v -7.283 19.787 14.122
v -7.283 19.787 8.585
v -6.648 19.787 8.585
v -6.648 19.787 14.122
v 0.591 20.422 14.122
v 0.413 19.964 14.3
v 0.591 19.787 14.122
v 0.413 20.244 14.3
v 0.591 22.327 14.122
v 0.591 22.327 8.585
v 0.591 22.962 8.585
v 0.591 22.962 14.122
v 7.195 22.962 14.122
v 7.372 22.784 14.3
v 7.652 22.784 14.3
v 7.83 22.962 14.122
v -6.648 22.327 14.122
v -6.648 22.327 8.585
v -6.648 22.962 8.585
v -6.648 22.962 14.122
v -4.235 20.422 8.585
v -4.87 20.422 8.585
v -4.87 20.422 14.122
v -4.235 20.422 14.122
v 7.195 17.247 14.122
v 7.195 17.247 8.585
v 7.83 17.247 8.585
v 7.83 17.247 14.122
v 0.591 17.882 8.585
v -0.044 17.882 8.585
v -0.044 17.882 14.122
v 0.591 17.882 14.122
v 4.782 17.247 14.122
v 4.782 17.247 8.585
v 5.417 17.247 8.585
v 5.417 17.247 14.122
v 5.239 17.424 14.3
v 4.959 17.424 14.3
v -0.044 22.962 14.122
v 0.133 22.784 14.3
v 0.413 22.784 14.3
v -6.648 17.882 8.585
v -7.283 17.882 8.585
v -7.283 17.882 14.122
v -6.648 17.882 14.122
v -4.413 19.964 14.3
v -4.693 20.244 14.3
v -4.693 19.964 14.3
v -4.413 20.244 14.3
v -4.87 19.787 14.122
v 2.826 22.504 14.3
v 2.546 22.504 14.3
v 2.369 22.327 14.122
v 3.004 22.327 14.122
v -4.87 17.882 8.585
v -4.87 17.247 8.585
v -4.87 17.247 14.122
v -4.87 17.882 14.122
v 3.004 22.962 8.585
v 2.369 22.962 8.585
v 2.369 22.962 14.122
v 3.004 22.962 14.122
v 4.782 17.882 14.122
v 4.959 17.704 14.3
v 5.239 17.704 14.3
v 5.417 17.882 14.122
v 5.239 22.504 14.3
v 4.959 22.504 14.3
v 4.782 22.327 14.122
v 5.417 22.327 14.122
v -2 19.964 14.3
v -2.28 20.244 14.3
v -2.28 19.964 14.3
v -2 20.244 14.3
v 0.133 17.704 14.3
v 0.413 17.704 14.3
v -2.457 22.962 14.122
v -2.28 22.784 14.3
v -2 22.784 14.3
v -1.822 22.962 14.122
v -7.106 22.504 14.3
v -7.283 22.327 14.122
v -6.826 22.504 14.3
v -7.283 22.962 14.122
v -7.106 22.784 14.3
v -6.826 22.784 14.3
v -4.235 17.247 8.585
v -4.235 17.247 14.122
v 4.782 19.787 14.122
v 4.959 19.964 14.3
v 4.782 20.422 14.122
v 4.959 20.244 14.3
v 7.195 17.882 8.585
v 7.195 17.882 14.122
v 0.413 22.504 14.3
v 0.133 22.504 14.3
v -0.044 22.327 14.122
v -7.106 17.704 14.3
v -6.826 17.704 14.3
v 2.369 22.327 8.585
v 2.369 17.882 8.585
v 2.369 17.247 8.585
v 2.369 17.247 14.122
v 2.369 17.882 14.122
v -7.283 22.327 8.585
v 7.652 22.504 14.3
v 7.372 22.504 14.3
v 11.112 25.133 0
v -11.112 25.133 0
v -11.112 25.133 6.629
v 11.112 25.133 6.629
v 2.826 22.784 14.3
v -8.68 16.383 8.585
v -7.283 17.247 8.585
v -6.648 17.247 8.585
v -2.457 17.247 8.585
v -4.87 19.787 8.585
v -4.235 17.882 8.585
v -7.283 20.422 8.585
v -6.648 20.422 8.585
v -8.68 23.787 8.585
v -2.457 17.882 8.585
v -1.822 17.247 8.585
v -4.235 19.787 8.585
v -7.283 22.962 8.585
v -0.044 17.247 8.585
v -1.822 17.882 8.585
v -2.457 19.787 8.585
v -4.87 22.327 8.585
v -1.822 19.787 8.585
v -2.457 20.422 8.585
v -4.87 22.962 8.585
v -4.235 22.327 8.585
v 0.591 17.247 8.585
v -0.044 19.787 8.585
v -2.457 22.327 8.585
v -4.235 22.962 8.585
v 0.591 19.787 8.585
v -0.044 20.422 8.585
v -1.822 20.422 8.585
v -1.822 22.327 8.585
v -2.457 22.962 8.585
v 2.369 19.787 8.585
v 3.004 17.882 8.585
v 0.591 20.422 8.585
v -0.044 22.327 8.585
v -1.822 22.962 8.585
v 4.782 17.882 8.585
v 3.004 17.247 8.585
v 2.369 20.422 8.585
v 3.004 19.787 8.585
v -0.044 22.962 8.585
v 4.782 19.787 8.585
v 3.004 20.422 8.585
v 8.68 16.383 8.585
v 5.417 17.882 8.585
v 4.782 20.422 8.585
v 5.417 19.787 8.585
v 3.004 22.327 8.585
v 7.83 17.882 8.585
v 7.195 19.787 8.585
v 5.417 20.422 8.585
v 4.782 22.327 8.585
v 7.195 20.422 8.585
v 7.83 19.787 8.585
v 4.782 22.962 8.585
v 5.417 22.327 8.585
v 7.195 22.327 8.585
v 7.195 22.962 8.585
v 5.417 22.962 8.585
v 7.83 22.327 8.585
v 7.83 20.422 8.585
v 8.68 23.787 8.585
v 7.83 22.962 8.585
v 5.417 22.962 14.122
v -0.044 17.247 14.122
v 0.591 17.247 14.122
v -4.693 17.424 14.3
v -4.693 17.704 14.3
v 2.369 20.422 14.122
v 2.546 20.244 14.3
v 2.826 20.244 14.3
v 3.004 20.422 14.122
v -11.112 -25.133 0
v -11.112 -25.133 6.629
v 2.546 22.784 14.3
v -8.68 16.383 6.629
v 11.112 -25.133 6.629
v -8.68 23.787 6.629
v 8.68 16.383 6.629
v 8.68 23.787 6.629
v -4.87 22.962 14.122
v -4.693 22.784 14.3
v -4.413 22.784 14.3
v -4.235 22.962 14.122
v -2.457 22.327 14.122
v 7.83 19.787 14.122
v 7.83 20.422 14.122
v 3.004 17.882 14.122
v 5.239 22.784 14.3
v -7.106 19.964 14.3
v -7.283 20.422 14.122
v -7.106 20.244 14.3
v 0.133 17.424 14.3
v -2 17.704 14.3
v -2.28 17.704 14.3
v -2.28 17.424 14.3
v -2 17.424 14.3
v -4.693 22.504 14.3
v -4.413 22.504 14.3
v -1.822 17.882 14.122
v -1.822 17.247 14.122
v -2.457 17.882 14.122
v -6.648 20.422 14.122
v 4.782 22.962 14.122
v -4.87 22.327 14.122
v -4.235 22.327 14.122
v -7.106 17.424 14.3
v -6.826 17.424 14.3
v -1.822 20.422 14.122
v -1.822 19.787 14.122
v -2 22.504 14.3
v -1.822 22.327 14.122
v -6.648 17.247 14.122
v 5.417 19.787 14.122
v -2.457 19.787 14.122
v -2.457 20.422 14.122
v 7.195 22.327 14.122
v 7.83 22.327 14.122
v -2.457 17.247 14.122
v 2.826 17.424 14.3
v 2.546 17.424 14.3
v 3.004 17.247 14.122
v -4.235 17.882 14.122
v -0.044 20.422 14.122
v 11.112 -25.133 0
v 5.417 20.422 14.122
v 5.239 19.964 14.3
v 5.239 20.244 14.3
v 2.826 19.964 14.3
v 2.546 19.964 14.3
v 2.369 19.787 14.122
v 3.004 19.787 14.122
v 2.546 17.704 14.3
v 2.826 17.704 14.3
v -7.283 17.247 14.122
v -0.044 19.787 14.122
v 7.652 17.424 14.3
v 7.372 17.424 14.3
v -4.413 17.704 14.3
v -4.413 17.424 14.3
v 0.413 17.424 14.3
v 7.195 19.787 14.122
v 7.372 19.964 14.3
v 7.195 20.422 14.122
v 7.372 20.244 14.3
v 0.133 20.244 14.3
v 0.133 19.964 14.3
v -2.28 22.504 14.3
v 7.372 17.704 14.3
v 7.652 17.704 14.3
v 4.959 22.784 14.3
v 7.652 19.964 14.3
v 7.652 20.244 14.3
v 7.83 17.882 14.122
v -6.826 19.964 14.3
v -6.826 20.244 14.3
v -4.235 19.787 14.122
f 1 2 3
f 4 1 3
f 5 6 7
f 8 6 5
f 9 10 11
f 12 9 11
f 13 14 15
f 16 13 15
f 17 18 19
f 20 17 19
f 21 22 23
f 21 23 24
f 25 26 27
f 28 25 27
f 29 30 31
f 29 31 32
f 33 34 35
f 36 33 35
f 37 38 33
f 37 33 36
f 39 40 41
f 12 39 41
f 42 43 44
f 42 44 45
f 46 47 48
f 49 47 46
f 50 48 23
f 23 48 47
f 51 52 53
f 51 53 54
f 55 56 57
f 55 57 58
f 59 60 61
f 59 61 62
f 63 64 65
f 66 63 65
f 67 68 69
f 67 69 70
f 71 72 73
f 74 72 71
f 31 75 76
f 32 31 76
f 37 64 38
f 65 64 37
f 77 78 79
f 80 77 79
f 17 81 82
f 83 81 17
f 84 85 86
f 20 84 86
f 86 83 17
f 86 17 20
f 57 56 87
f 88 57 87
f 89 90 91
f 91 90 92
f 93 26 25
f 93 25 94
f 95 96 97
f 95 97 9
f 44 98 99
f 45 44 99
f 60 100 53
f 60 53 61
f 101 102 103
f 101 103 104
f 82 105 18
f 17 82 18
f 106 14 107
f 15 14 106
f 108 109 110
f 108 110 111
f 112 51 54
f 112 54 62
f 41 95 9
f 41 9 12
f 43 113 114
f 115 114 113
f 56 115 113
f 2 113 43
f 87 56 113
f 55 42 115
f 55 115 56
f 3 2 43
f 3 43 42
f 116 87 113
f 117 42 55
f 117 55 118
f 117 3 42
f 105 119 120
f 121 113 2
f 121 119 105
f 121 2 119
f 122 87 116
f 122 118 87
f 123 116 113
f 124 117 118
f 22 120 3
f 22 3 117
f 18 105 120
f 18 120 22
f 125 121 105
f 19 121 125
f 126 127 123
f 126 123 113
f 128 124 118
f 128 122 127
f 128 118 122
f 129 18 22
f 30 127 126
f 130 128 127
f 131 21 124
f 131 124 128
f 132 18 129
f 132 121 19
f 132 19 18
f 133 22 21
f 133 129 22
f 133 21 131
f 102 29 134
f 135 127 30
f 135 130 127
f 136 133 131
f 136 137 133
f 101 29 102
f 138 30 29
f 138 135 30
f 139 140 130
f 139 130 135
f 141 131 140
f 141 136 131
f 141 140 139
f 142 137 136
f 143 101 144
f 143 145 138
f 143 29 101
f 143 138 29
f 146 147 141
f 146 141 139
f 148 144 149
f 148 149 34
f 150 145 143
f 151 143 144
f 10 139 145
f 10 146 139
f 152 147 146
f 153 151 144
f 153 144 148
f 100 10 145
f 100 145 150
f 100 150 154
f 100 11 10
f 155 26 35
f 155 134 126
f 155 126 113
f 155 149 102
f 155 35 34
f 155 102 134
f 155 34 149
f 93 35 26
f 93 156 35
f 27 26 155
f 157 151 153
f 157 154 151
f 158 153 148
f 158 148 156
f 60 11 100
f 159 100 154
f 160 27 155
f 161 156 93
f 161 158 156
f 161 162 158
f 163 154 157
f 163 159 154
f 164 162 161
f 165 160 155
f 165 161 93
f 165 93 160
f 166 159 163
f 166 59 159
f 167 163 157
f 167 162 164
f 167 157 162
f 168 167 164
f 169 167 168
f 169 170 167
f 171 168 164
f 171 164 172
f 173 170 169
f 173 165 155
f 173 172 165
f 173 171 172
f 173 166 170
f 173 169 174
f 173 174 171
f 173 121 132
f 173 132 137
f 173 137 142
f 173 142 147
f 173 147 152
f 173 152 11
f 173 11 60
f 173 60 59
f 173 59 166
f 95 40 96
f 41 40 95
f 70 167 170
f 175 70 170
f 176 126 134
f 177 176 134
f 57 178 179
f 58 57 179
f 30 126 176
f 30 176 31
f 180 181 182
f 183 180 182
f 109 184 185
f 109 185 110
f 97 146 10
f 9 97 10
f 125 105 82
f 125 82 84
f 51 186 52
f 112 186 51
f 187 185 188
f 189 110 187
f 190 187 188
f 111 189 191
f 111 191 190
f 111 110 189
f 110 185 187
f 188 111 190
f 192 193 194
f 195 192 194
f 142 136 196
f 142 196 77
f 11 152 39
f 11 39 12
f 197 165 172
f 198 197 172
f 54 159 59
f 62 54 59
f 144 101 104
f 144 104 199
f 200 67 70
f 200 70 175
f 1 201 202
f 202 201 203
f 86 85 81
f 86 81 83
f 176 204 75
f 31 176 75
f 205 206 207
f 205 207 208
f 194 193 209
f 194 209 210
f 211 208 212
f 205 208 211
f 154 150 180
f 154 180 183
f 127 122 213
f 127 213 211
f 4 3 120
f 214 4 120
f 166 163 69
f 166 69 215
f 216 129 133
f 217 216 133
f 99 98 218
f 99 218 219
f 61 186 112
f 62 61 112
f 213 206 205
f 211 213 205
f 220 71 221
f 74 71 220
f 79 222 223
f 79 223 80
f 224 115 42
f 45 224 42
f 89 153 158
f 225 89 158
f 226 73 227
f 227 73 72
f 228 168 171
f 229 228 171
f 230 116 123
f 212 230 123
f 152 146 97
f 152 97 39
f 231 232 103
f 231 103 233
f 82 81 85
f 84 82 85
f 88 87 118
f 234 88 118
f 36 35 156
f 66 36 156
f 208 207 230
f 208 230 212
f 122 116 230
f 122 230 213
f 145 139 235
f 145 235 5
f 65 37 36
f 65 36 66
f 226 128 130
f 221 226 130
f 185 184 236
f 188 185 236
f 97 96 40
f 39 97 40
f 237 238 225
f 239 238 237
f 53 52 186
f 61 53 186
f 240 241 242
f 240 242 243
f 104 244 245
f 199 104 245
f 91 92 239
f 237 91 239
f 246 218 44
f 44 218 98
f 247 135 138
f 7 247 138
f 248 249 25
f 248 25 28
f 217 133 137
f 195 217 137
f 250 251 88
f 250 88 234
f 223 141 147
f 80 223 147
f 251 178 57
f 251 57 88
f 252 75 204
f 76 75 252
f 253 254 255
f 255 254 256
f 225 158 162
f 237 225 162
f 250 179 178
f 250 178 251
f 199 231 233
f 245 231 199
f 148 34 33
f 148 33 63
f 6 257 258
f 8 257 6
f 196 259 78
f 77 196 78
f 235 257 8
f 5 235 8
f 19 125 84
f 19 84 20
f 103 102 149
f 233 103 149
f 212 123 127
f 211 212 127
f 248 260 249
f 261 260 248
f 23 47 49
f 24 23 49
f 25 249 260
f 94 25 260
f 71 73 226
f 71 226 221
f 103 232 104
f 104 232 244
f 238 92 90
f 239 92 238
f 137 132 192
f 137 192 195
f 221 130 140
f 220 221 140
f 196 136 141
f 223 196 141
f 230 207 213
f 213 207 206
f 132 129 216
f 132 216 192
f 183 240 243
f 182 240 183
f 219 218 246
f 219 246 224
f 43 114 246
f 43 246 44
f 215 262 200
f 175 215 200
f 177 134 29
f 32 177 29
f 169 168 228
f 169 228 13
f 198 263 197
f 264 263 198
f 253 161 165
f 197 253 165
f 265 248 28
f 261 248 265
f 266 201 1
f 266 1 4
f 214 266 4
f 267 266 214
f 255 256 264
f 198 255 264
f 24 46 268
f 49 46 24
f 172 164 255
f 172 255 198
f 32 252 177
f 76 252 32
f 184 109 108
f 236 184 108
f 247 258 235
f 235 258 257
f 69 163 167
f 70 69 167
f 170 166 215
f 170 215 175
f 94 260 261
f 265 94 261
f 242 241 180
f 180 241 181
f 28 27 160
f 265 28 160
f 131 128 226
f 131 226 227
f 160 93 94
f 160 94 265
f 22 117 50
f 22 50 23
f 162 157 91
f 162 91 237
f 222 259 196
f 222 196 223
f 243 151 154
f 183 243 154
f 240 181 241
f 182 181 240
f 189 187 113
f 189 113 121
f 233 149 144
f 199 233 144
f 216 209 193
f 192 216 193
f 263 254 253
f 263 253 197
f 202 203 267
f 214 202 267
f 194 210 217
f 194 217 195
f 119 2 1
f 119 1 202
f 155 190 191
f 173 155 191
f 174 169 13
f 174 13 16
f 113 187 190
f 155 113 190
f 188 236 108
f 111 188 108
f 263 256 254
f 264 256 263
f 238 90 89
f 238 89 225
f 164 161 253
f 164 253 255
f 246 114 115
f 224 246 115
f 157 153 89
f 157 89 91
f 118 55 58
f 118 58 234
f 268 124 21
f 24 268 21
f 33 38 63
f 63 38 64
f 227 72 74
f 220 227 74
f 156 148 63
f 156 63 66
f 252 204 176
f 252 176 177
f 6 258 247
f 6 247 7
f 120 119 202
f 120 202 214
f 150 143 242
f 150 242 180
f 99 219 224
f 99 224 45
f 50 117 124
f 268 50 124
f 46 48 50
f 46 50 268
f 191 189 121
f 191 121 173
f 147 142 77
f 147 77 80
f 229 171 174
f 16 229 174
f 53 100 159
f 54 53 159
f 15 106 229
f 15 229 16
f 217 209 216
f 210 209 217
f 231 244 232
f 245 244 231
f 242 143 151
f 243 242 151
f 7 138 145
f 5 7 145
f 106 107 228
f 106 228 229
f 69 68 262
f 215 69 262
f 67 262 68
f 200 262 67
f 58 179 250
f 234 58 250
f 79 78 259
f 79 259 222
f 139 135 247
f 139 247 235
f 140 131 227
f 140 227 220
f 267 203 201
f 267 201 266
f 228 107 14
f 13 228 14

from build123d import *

# Parameters (mm, degrees)
F0_W     = 22.225
F0_H     = 50.2666
F1_DEPTH = 6.6294
F2_W     = 17.3609
F2_H     = 7.4041
F3_DEPTH = 1.9558
F4_W     = 0.635
F4_H     = 0.635
F5_DEPTH = 5.715
F6_SIZE  = 0.1778


with BuildPart() as f1:
    # F0 (on Top) → F1 (new body)
    with BuildSketch(Plane.XY):
        Rectangle(F0_W, F0_H)
    extrude(amount=F1_DEPTH)

    # F2 (on face) → F3 (join)
    with BuildSketch(Plane.XY.offset(6.6294)):
        with Locations((0, 20.08505)):
            Rectangle(F2_W, F2_H)
    extrude(amount=F3_DEPTH)

    # F4 (on face) → F5 (join)
    with BuildSketch(Plane.XY.offset(8.5852)):
        with Locations((7.51205, 22.6441)):
            Rectangle(F4_W, F4_H)
        with Locations((5.09905, 22.6441)):
            Rectangle(F4_W, F4_H)
        with Locations((2.68605, 22.6441)):
            Rectangle(F4_W, F4_H)
        with Locations((0.27305, 22.6441)):
            Rectangle(F4_W, F4_H)
        with Locations((-2.13995, 22.6441)):
            Rectangle(F4_W, F4_H)
        with Locations((-4.55295, 22.6441)):
            Rectangle(F4_W, F4_H)
        with Locations((-6.96595, 22.6441)):
            Rectangle(F4_W, F4_H)
        with Locations((-6.96595, 20.1041)):
            Rectangle(F4_W, F4_H)
        with Locations((-4.55295, 20.1041)):
            Rectangle(F4_W, F4_H)
        with Locations((-2.13995, 20.1041)):
            Rectangle(F4_W, F4_H)
        with Locations((0.27305, 20.1041)):
            Rectangle(F4_W, F4_H)
        with Locations((2.68605, 20.1041)):
            Rectangle(F4_W, F4_H)
        with Locations((5.09905, 20.1041)):
            Rectangle(F4_W, F4_H)
        with Locations((7.51205, 20.1041)):
            Rectangle(F4_W, F4_H)
        with Locations((-6.96595, 17.5641)):
            Rectangle(F4_W, F4_H)
        with Locations((-4.55295, 17.5641)):
            Rectangle(F4_W, F4_H)
        with Locations((-2.13995, 17.5641)):
            Rectangle(F4_W, F4_H)
        with Locations((0.27305, 17.5641)):
            Rectangle(F4_W, F4_H)
        with Locations((2.68605, 17.5641)):
            Rectangle(F4_W, F4_H)
        with Locations((5.09905, 17.5641)):
            Rectangle(F4_W, F4_H)
        with Locations((7.51205, 17.5641)):
            Rectangle(F4_W, F4_H)
    extrude(amount=F5_DEPTH)

    # F6
    f6_edges = [f1.edges().sort_by_distance(p)[0] for p in [
        (-6.96595, 22.9616, 14.3002),
        (-7.28345, 22.6441, 14.3002),
        (-6.96595, 22.3266, 14.3002),
        (-6.64845, 22.6441, 14.3002),
        (-6.64845, 20.1041, 14.3002),
        (-6.96595, 20.4216, 14.3002),
        (-7.28345, 20.1041, 14.3002),
        (-6.96595, 19.7866, 14.3002),
        (-4.55295, 22.9616, 14.3002),
        (-4.87045, 22.6441, 14.3002),
        (-4.55295, 22.3266, 14.3002),
        (-4.23545, 22.6441, 14.3002),
        (-4.55295, 20.4216, 14.3002),
        (-4.87045, 20.1041, 14.3002),
        (-4.55295, 19.7866, 14.3002),
        (-4.23545, 20.1041, 14.3002),
        (-6.64845, 17.5641, 14.3002),
        (-6.96595, 17.8816, 14.3002),
        (-7.28345, 17.5641, 14.3002),
        (-6.96595, 17.2466, 14.3002),
        (-4.55295, 17.8816, 14.3002),
        (-4.87045, 17.5641, 14.3002),
        (-4.55295, 17.2466, 14.3002),
        (-4.23545, 17.5641, 14.3002),
        (-2.13995, 20.4216, 14.3002),
        (-2.45745, 20.1041, 14.3002),
        (-2.13995, 19.7866, 14.3002),
        (-1.82245, 20.1041, 14.3002),
        (-2.13995, 22.9616, 14.3002),
        (-2.45745, 22.6441, 14.3002),
        (-2.13995, 22.3266, 14.3002),
        (-1.82245, 22.6441, 14.3002),
        (-2.13995, 17.8816, 14.3002),
        (-2.45745, 17.5641, 14.3002),
        (-2.13995, 17.2466, 14.3002),
        (-1.82245, 17.5641, 14.3002),
        (0.27305, 17.8816, 14.3002),
        (-0.04445, 17.5641, 14.3002),
        (0.27305, 17.2466, 14.3002),
        (0.59055, 17.5641, 14.3002),
        (0.27305, 20.4216, 14.3002),
        (-0.04445, 20.1041, 14.3002),
        (0.27305, 19.7866, 14.3002),
        (0.59055, 20.1041, 14.3002),
        (0.27305, 22.9616, 14.3002),
        (-0.04445, 22.6441, 14.3002),
        (0.27305, 22.3266, 14.3002),
        (0.59055, 22.6441, 14.3002),
        (2.68605, 22.9616, 14.3002),
        (2.36855, 22.6441, 14.3002),
        (2.68605, 22.3266, 14.3002),
        (3.00355, 22.6441, 14.3002),
        (2.36855, 20.1041, 14.3002),
        (2.68605, 19.7866, 14.3002),
        (2.68605, 20.4216, 14.3002),
        (3.00355, 20.1041, 14.3002),
        (2.68605, 17.8816, 14.3002),
        (2.36855, 17.5641, 14.3002),
        (2.68605, 17.2466, 14.3002),
        (3.00355, 17.5641, 14.3002),
        (5.09905, 20.4216, 14.3002),
        (4.78155, 20.1041, 14.3002),
        (5.09905, 19.7866, 14.3002),
        (5.41655, 20.1041, 14.3002),
        (5.09905, 17.8816, 14.3002),
        (4.78155, 17.5641, 14.3002),
        (5.09905, 17.2466, 14.3002),
        (5.41655, 17.5641, 14.3002),
        (5.09905, 22.9616, 14.3002),
        (4.78155, 22.6441, 14.3002),
        (5.09905, 22.3266, 14.3002),
        (5.41655, 22.6441, 14.3002),
        (7.19455, 20.1041, 14.3002),
        (7.51205, 19.7866, 14.3002),
        (7.82955, 20.1041, 14.3002),
        (7.51205, 20.4216, 14.3002),
        (7.19455, 17.5641, 14.3002),
        (7.51205, 17.2466, 14.3002),
        (7.82955, 17.5641, 14.3002),
        (7.51205, 17.8816, 14.3002),
        (7.51205, 22.9616, 14.3002),
        (7.19455, 22.6441, 14.3002),
        (7.51205, 22.3266, 14.3002),
        (7.82955, 22.6441, 14.3002),
    ]]
    chamfer(f6_edges, length=F6_SIZE)


solid = f1.part
